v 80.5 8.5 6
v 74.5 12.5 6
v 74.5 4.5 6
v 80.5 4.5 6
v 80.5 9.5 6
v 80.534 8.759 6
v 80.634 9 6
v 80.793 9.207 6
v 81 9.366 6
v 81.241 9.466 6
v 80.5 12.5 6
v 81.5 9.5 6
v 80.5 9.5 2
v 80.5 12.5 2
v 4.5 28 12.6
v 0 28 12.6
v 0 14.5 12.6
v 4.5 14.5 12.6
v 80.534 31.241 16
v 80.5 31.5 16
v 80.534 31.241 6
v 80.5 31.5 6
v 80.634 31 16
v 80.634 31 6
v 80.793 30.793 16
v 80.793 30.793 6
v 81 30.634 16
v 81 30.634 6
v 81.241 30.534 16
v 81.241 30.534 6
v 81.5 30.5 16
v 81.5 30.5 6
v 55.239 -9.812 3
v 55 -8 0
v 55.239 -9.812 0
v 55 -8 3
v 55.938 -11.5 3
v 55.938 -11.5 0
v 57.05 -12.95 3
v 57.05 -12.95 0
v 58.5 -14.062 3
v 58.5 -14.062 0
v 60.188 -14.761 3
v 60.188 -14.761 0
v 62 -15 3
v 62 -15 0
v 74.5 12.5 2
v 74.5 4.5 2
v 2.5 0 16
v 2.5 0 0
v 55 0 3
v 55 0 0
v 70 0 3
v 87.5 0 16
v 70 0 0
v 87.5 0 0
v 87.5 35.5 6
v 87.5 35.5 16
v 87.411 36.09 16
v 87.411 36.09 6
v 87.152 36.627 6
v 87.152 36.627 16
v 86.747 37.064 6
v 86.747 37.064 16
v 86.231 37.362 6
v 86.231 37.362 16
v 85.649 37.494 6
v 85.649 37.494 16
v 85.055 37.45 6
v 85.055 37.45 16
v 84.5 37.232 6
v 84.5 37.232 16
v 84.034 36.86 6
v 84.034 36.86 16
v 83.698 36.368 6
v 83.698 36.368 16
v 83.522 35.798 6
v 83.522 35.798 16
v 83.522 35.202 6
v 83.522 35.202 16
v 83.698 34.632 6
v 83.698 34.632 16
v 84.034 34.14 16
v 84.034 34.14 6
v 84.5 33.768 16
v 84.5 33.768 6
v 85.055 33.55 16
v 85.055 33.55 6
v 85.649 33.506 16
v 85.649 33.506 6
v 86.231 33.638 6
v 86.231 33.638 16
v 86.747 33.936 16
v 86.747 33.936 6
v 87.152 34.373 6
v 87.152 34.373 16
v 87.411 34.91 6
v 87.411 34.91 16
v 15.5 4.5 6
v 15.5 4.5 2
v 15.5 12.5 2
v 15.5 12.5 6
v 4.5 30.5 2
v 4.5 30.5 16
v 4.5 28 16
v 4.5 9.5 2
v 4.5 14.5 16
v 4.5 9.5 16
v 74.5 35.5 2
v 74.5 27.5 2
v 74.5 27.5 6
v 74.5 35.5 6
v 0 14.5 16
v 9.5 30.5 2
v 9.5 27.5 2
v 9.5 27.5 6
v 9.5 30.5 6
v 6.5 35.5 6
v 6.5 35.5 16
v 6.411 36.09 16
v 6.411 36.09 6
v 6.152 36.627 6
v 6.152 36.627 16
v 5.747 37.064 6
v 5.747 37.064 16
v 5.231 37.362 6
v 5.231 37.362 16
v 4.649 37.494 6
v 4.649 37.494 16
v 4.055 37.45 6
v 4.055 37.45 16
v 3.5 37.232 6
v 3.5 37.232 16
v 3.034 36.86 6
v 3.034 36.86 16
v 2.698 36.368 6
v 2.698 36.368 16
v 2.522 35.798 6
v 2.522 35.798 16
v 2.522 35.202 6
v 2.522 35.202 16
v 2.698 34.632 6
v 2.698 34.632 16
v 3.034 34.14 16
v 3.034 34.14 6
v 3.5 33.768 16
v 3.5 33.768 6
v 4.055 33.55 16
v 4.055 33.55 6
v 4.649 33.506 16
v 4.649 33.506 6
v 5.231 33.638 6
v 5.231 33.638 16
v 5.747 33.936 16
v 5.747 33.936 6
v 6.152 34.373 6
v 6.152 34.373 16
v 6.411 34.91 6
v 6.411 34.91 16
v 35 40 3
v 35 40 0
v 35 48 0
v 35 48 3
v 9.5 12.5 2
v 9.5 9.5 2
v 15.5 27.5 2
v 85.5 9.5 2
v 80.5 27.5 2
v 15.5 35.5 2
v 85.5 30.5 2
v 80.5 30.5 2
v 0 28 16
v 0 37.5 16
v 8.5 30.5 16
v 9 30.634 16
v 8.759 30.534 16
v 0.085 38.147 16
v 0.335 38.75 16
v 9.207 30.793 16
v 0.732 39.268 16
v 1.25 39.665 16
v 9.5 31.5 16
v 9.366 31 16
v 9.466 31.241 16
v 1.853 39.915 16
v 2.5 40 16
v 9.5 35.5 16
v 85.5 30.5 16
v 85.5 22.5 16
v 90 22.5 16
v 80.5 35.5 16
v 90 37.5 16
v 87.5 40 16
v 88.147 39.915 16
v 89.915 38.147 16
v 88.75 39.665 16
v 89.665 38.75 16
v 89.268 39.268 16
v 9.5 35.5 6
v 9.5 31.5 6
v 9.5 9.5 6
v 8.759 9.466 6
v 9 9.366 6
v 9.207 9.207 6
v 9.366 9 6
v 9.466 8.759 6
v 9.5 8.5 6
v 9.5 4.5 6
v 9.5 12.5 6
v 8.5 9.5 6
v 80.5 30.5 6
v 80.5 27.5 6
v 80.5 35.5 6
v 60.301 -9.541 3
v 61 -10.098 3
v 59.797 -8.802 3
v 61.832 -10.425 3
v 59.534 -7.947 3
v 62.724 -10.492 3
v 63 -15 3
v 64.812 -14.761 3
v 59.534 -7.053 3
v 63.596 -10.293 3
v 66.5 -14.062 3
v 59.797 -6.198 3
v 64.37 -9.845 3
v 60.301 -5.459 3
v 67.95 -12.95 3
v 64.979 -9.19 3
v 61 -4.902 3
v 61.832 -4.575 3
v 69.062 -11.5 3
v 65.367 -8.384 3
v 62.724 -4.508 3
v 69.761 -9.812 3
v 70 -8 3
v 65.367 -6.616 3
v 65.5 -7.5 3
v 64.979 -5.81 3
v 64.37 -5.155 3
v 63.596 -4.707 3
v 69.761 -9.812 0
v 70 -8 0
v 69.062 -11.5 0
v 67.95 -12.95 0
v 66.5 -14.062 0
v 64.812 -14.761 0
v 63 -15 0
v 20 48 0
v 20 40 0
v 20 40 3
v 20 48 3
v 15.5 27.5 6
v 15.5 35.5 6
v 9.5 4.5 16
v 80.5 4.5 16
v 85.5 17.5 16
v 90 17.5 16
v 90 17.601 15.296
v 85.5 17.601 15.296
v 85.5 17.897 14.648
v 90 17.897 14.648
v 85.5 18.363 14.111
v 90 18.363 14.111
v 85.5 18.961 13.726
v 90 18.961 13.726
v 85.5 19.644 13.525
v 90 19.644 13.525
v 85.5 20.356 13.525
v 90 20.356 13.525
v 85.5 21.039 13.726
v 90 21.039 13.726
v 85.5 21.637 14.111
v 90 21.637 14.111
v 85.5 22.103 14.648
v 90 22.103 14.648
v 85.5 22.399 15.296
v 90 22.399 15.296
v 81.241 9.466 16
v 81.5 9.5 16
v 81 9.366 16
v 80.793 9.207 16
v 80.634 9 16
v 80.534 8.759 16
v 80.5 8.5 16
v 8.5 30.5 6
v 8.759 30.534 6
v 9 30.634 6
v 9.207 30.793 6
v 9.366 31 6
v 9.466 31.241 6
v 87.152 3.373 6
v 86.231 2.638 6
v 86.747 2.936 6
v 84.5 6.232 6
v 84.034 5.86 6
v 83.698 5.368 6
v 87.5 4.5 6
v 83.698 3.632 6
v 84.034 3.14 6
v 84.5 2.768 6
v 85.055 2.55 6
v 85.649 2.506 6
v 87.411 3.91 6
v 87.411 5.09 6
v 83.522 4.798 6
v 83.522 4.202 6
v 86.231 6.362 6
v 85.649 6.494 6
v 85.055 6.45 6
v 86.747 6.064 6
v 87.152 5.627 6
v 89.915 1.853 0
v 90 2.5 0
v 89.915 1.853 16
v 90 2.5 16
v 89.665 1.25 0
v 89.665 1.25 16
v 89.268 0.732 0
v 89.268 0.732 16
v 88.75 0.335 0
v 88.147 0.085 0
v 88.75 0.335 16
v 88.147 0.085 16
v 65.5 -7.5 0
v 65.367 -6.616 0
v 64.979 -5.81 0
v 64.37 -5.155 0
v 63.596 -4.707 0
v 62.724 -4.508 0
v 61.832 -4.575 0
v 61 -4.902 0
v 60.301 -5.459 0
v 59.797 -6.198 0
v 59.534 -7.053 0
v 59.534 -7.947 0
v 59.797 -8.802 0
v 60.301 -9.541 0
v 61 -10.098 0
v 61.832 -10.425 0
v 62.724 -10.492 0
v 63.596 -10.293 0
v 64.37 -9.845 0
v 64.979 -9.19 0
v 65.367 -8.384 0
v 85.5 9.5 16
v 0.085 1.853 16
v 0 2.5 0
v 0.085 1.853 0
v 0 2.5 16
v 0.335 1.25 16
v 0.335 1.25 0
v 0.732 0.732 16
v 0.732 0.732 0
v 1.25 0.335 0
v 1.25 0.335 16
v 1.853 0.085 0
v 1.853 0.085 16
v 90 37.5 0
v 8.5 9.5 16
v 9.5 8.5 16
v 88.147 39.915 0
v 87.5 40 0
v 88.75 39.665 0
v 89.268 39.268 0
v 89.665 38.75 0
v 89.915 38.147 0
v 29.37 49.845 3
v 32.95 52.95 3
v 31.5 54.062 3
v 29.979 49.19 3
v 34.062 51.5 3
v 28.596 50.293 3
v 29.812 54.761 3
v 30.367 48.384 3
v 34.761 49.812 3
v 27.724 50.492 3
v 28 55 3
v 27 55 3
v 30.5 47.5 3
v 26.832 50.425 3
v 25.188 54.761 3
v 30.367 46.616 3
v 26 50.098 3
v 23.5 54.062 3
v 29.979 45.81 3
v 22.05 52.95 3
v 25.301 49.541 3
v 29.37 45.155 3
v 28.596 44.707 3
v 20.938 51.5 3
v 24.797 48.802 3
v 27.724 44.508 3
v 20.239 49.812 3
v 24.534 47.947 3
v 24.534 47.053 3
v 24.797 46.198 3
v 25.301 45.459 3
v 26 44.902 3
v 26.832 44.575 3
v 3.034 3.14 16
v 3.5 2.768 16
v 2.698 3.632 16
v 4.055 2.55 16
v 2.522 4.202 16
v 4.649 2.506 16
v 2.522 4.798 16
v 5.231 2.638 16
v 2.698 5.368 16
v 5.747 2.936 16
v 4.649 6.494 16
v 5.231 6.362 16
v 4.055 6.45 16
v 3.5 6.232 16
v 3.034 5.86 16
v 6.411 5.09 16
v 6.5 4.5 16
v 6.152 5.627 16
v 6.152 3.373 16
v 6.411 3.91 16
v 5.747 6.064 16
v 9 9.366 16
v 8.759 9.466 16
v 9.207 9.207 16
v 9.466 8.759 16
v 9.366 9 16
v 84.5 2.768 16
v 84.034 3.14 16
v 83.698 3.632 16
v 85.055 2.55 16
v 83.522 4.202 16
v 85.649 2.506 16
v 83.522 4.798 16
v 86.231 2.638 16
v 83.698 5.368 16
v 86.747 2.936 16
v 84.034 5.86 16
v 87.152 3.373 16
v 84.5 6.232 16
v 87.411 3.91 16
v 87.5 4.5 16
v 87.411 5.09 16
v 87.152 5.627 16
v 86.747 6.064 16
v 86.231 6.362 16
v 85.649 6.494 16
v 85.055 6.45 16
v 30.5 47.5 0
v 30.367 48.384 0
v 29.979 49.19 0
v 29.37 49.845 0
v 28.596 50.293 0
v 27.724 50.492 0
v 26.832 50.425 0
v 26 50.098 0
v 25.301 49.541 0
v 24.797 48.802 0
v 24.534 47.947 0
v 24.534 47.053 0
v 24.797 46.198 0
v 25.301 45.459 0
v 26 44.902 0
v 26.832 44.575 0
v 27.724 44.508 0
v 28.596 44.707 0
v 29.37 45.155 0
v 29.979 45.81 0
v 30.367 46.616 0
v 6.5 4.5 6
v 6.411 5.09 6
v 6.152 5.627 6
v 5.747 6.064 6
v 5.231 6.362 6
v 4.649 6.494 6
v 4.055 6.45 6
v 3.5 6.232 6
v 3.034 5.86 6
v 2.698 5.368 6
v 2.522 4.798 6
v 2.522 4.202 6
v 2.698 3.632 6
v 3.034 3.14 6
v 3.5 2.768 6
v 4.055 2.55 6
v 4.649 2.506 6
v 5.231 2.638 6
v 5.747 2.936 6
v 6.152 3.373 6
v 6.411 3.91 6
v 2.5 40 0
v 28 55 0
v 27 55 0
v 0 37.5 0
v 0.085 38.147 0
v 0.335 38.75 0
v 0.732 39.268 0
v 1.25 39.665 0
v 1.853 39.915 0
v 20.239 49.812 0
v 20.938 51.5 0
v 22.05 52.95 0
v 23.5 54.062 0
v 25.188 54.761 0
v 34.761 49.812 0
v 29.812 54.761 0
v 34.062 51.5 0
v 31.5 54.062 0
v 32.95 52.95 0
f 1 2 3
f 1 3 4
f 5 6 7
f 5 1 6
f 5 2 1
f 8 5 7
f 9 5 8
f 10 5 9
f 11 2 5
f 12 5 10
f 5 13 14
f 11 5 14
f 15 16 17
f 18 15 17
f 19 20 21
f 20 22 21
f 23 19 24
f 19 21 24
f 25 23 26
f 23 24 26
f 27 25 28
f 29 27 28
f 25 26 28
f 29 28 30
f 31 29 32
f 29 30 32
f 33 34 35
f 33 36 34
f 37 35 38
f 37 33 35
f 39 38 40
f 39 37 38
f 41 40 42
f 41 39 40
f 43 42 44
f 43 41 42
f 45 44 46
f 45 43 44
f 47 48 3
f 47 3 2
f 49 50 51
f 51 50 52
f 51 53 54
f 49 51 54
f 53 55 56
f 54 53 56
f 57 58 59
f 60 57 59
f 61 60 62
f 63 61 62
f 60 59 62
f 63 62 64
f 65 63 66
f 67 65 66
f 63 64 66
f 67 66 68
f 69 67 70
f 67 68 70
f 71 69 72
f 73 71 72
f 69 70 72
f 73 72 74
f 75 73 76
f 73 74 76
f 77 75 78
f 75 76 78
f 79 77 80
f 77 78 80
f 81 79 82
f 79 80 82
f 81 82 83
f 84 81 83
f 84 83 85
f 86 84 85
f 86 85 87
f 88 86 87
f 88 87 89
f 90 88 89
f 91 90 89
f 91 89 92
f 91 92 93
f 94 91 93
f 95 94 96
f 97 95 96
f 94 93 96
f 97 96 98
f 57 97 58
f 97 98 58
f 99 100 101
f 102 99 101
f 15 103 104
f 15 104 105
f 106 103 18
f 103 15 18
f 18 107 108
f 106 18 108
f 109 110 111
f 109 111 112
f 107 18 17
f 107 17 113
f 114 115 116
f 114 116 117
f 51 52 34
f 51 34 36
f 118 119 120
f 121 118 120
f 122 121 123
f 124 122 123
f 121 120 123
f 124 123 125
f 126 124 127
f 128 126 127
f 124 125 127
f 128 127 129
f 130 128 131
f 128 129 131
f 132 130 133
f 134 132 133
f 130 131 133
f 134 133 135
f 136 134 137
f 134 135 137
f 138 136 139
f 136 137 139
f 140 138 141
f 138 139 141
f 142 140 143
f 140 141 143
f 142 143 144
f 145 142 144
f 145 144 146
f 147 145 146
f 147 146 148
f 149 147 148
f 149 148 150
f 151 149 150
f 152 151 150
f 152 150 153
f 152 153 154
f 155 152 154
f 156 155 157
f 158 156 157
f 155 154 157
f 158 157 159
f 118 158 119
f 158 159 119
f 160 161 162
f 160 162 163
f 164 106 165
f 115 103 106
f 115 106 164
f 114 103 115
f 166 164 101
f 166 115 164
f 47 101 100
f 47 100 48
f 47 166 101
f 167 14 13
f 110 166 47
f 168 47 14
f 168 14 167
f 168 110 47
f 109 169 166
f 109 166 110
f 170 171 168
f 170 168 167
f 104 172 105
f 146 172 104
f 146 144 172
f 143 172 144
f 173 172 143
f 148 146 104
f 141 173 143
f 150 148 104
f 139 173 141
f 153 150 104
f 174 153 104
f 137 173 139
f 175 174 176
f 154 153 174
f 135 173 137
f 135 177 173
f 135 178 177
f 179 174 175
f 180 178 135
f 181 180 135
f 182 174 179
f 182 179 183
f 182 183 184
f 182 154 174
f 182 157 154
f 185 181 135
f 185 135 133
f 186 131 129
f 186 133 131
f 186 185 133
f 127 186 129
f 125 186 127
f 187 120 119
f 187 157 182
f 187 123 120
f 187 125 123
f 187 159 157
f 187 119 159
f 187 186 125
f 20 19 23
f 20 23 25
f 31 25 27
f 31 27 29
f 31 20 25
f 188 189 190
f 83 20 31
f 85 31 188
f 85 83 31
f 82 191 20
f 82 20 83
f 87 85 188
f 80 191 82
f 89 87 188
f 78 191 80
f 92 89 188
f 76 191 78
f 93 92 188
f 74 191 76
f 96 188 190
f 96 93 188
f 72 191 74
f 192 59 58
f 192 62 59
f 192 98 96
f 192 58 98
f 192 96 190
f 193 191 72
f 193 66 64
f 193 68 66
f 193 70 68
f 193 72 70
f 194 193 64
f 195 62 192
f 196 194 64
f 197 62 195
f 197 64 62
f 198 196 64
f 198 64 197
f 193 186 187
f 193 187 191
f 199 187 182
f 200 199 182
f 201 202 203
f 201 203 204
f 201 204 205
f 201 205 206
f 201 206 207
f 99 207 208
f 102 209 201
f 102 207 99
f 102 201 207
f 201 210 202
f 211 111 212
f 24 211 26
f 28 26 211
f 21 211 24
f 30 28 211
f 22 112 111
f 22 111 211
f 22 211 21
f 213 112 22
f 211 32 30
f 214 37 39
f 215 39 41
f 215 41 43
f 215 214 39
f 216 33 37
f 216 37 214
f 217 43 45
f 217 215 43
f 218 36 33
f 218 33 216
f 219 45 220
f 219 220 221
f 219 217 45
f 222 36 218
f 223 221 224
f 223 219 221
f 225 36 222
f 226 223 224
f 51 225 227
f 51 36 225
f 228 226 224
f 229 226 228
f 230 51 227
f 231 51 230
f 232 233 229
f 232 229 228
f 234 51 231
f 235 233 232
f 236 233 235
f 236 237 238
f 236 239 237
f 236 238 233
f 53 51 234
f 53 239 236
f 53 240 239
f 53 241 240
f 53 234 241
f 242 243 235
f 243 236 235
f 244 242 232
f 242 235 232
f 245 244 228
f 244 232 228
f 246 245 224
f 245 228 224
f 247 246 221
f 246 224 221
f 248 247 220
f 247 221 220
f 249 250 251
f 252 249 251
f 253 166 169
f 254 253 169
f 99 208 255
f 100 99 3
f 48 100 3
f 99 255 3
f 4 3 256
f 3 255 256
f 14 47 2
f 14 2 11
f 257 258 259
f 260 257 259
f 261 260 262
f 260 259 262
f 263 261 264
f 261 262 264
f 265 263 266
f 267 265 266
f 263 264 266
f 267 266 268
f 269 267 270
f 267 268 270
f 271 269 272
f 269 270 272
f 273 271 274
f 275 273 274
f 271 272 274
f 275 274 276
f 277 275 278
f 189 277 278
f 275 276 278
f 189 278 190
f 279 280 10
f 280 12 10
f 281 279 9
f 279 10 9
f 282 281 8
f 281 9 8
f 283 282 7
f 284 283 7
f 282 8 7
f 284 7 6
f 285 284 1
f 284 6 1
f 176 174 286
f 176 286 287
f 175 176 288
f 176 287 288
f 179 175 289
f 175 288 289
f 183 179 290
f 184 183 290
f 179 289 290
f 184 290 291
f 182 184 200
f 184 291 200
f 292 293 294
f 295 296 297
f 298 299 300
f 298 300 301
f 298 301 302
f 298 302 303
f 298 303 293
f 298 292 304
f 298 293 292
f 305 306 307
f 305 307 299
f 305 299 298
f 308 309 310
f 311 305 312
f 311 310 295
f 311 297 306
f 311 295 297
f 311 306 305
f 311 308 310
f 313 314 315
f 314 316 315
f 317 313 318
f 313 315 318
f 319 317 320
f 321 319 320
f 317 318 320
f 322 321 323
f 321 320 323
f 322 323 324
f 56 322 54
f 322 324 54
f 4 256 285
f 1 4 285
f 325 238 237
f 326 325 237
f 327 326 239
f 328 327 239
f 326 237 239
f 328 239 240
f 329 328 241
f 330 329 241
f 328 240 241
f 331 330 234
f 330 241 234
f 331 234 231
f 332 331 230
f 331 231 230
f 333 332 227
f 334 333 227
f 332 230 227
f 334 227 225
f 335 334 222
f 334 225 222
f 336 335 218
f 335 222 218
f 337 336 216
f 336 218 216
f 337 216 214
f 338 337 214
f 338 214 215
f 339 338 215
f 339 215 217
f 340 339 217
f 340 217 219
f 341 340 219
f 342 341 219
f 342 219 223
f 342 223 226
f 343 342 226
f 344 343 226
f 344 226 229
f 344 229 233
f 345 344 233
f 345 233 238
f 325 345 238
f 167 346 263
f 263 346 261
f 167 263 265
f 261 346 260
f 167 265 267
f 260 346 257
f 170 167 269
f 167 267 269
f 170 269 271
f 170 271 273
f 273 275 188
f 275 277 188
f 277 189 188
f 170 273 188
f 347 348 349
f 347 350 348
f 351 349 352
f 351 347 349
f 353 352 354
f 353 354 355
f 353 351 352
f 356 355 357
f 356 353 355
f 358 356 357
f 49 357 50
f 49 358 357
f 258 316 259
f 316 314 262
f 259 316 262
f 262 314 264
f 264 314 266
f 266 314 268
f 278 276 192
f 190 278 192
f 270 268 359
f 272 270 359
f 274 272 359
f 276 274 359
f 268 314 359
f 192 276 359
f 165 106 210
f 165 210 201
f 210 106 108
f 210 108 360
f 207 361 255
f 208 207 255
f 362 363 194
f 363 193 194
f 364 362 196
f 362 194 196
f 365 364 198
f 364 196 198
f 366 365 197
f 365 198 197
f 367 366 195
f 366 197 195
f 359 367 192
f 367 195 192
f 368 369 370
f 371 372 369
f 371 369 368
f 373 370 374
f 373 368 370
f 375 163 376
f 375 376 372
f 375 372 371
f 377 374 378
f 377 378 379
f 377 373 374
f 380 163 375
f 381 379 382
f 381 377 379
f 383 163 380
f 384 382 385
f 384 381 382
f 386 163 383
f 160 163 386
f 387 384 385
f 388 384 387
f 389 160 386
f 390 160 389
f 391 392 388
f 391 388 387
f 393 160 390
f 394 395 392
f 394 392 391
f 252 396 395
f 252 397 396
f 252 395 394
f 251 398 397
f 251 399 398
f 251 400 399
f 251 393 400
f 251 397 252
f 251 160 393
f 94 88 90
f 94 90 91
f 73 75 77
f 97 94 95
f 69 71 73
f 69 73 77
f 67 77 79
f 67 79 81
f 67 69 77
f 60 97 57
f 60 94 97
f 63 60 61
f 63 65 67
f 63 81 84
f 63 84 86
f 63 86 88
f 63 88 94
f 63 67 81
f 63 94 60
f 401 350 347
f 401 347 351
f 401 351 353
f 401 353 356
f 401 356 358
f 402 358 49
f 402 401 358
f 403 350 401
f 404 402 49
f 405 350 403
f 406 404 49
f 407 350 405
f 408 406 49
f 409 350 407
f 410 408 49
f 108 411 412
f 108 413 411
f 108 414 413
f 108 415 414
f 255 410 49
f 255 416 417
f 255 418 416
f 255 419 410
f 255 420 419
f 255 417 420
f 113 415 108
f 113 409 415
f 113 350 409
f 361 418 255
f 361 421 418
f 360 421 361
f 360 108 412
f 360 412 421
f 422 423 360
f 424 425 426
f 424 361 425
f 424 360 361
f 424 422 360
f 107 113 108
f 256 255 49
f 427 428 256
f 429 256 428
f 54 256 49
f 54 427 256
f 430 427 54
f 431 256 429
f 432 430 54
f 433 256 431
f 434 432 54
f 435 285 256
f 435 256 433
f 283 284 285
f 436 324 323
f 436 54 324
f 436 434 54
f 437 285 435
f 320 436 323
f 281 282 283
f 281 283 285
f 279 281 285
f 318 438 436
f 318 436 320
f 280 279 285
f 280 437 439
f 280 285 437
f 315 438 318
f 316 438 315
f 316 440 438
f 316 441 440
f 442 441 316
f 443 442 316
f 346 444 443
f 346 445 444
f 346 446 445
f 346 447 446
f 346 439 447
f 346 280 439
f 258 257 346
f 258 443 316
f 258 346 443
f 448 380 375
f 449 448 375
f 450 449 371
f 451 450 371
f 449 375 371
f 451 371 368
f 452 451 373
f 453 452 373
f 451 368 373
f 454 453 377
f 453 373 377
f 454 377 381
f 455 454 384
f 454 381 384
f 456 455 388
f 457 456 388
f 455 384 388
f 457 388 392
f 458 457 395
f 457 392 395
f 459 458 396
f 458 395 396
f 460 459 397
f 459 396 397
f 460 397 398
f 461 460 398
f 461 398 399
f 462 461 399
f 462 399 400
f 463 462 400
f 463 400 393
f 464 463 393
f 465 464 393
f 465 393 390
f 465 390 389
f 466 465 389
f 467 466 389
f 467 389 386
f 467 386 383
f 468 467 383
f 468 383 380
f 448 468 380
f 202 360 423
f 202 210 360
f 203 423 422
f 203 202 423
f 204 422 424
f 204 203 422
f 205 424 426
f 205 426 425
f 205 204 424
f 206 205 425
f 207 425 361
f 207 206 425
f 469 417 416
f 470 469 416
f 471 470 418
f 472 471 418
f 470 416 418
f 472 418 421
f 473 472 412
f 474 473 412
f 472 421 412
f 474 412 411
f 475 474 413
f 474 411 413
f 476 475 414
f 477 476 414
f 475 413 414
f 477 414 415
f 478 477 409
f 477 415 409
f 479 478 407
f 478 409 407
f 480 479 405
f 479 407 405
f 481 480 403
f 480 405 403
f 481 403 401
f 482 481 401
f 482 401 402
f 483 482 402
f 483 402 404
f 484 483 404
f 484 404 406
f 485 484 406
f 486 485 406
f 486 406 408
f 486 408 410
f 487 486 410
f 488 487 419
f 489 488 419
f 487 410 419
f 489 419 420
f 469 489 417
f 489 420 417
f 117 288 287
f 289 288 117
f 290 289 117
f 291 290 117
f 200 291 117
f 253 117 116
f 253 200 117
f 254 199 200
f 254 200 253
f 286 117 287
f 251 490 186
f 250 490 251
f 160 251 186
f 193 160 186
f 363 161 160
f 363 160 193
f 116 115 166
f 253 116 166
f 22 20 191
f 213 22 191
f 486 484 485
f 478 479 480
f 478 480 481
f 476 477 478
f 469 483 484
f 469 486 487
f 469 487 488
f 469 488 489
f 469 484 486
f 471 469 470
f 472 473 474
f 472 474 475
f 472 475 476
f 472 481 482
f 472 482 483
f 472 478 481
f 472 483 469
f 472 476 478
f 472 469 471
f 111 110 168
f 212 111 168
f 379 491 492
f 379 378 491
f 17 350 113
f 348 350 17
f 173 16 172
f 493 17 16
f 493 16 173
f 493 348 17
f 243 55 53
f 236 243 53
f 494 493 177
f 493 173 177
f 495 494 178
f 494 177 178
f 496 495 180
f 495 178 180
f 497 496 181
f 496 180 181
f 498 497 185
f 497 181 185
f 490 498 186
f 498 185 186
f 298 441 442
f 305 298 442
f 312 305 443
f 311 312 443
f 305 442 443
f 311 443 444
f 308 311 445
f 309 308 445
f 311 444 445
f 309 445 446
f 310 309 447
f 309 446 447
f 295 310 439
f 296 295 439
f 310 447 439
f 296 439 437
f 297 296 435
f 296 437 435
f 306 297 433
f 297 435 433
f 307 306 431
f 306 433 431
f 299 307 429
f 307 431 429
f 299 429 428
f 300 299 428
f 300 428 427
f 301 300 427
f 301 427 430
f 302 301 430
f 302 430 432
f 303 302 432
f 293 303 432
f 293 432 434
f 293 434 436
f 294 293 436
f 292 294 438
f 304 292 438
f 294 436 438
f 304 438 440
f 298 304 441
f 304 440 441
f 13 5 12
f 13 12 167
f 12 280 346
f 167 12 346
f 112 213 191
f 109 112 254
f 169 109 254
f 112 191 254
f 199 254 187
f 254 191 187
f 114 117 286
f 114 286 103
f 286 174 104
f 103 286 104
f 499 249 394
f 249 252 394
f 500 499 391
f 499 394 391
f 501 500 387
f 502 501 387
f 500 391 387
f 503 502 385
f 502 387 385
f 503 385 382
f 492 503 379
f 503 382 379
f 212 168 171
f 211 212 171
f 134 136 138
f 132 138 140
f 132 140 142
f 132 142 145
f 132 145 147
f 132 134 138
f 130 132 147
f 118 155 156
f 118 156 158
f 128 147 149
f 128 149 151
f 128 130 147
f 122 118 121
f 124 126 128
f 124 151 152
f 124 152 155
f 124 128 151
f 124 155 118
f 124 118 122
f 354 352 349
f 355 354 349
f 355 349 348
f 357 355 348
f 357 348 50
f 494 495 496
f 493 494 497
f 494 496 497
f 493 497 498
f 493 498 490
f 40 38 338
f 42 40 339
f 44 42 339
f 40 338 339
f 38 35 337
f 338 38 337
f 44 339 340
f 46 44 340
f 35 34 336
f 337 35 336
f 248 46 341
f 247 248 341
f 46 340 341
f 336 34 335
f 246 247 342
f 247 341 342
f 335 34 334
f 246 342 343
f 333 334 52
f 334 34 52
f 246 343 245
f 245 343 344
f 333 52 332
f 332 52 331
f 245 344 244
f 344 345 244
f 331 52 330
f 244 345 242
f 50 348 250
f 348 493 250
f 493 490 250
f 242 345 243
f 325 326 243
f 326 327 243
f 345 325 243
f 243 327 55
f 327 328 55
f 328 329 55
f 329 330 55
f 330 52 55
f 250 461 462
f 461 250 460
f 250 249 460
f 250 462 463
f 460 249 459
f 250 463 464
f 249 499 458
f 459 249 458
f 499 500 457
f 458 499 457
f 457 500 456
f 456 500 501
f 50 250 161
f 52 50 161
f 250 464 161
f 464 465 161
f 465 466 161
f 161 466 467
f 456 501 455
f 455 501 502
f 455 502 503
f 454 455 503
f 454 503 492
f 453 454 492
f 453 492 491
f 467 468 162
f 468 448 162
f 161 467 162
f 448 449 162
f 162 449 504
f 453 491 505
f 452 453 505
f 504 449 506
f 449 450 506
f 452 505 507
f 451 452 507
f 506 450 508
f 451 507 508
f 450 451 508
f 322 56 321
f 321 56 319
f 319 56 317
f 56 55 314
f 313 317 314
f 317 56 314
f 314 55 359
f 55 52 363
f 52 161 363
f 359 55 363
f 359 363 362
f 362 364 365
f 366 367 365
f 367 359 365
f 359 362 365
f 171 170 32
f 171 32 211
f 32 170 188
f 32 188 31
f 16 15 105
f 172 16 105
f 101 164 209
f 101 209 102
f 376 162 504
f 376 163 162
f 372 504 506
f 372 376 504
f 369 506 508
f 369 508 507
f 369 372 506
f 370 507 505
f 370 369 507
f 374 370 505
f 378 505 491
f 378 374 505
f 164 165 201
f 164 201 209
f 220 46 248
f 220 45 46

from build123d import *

# Parameters (mm, degrees)
SKETCH_W        = 90
SKETCH_H        = 40
PAD_DEPTH       = 16
POCKET_DEPTH    = 14
POCKET001_DEPTH = 6
SKETCH003_W     = 13.5
SKETCH003_H     = 3.4
POCKET002_DEPTH = 6
SKETCH005_R     = 2
POCKET003_DEPTH = 10
SKETCH006_W     = 6
SKETCH006_H     = 8
PAD001_DEPTH    = 4
FILLET_R        = 2.5
FILLET001_R     = 1
SKETCH007_W     = 15
SKETCH007_H     = 3
PAD002_DEPTH    = 15
FILLET002_R     = 7
SKETCH008_R     = 3
HOLE_DEPTH      = 25
SKETCH009_W     = 15
SKETCH009_H     = 3
PAD003_DEPTH    = 15
FILLET003_R     = 7
SKETCH010_R     = 3
HOLE001_DEPTH   = 25


with BuildPart() as part:
    # Sketch → Pad (new body)
    with BuildSketch(Plane.XY):
        with Locations((45, 20)):
            Rectangle(SKETCH_W, SKETCH_H)
    extrude(amount=PAD_DEPTH)

    # Sketch001 (on Face6 of Pad) → Pocket (cut)
    with BuildSketch(Plane.XY.offset(16)):
        Polygon((4.5, 30.5), (4.5, 9.5), (9.5, 9.5), (9.5, 4.5), (80.5, 4.5), (80.5, 9.5), (85.5, 9.5), (85.5, 30.5), (80.5, 30.5), (80.5, 35.5), (9.5, 35.5), (9.5, 30.5), align=None)
    extrude(amount=-POCKET_DEPTH, mode=Mode.SUBTRACT)

    # Sketch002 (on Face6 of Pocket) → Pocket001 (cut)
    with BuildSketch(Plane.YZ.offset(90)):
        with BuildLine():
            ThreePointArc((17.5, 16), (20, 13.499987), (22.5, 16))
            Line((17.5, 16), (22.5, 16))
        make_face()
    extrude(amount=-POCKET001_DEPTH, mode=Mode.SUBTRACT)

    # Sketch003 (on Face1 of Pocket001) → Pocket002 (cut)
    with BuildSketch(Plane(origin=(0, 0, 0), x_dir=(0, -1, 0), z_dir=(-1, 0, 0))):
        with Locations((-21.25, 14.3)):
            Rectangle(SKETCH003_W, SKETCH003_H)
    extrude(amount=-POCKET002_DEPTH, mode=Mode.SUBTRACT)

    # Sketch005 (on Face8 of Pocket002) → Pocket003 (cut)
    with BuildSketch(Plane.XY.offset(16)):
        with Locations((4.5, 35.5)):
            Circle(SKETCH005_R)
        with Locations((4.5, 4.5)):
            Circle(SKETCH005_R)
        with Locations((85.5, 35.5)):
            Circle(SKETCH005_R)
        with Locations((85.5, 4.5)):
            Circle(SKETCH005_R)
    extrude(amount=-POCKET003_DEPTH, mode=Mode.SUBTRACT)

    # Sketch006 (on Face28 of Pocket003) → Pad001 (join)
    with BuildSketch(Plane.XY.offset(2)):
        with Locations((77.5, 31.5)):
            Rectangle(SKETCH006_W, SKETCH006_H)
        with Locations((12.5, 8.5)):
            Rectangle(SKETCH006_W, SKETCH006_H)
        with Locations((12.5, 31.5)):
            Rectangle(SKETCH006_W, SKETCH006_H)
        with Locations((77.5, 8.5)):
            Rectangle(SKETCH006_W, SKETCH006_H)
    extrude(amount=PAD001_DEPTH)

    # Fillet
    fillet_edges = [part.edges().sort_by_distance(p)[0] for p in [
        (0, 0, 8),
        (90, 0, 8),
        (90, 40, 8),
        (0, 40, 8),
    ]]
    fillet(fillet_edges, radius=FILLET_R)

    # Fillet001
    fillet001_edges = [part.edges().sort_by_distance(p)[0] for p in [
        (9.5, 30.5, 11),
        (80.5, 30.5, 11),
        (80.5, 9.5, 11),
        (9.5, 9.5, 11),
    ]]
    fillet(fillet001_edges, radius=FILLET001_R)

    # Sketch007 (on Face50 of Fillet001) → Pad002 (join)
    with BuildSketch(Plane.XZ):
        with Locations((62.5, 1.5)):
            Rectangle(SKETCH007_W, SKETCH007_H)
    extrude(amount=PAD002_DEPTH)

    # Fillet002
    fillet002_edges = [part.edges().sort_by_distance(p)[0] for p in [
        (55, -15, 1.5),
        (70, -15, 1.5),
    ]]
    fillet(fillet002_edges, radius=FILLET002_R)

    # Sketch008 (on Face8 of Fillet002) → Hole (cut)
    with BuildSketch(Plane.XY.offset(3)):
        with Locations((62.5, -7.5)):
            Circle(SKETCH008_R)
    extrude(amount=-HOLE_DEPTH, mode=Mode.SUBTRACT)

    # Sketch009 (on Face14 of Hole) → Pad003 (join)
    with BuildSketch(Plane(origin=(0, 40, 0), x_dir=(-1, 0, 0), z_dir=(0, 1, 0))):
        with Locations((-27.5, 1.5)):
            Rectangle(SKETCH009_W, SKETCH009_H)
    extrude(amount=PAD003_DEPTH)

    # Fillet003
    fillet003_edges = [part.edges().sort_by_distance(p)[0] for p in [
        (35, 55, 1.5),
        (20, 55, 1.5),
    ]]
    fillet(fillet003_edges, radius=FILLET003_R)

    # Sketch010 (on Face8 of Fillet003) → Hole001 (cut)
    with BuildSketch(Plane.XY.offset(3)):
        with Locations((27.5, 47.5)):
            Circle(SKETCH010_R)
    extrude(amount=-HOLE001_DEPTH, mode=Mode.SUBTRACT)


solid = part.part
